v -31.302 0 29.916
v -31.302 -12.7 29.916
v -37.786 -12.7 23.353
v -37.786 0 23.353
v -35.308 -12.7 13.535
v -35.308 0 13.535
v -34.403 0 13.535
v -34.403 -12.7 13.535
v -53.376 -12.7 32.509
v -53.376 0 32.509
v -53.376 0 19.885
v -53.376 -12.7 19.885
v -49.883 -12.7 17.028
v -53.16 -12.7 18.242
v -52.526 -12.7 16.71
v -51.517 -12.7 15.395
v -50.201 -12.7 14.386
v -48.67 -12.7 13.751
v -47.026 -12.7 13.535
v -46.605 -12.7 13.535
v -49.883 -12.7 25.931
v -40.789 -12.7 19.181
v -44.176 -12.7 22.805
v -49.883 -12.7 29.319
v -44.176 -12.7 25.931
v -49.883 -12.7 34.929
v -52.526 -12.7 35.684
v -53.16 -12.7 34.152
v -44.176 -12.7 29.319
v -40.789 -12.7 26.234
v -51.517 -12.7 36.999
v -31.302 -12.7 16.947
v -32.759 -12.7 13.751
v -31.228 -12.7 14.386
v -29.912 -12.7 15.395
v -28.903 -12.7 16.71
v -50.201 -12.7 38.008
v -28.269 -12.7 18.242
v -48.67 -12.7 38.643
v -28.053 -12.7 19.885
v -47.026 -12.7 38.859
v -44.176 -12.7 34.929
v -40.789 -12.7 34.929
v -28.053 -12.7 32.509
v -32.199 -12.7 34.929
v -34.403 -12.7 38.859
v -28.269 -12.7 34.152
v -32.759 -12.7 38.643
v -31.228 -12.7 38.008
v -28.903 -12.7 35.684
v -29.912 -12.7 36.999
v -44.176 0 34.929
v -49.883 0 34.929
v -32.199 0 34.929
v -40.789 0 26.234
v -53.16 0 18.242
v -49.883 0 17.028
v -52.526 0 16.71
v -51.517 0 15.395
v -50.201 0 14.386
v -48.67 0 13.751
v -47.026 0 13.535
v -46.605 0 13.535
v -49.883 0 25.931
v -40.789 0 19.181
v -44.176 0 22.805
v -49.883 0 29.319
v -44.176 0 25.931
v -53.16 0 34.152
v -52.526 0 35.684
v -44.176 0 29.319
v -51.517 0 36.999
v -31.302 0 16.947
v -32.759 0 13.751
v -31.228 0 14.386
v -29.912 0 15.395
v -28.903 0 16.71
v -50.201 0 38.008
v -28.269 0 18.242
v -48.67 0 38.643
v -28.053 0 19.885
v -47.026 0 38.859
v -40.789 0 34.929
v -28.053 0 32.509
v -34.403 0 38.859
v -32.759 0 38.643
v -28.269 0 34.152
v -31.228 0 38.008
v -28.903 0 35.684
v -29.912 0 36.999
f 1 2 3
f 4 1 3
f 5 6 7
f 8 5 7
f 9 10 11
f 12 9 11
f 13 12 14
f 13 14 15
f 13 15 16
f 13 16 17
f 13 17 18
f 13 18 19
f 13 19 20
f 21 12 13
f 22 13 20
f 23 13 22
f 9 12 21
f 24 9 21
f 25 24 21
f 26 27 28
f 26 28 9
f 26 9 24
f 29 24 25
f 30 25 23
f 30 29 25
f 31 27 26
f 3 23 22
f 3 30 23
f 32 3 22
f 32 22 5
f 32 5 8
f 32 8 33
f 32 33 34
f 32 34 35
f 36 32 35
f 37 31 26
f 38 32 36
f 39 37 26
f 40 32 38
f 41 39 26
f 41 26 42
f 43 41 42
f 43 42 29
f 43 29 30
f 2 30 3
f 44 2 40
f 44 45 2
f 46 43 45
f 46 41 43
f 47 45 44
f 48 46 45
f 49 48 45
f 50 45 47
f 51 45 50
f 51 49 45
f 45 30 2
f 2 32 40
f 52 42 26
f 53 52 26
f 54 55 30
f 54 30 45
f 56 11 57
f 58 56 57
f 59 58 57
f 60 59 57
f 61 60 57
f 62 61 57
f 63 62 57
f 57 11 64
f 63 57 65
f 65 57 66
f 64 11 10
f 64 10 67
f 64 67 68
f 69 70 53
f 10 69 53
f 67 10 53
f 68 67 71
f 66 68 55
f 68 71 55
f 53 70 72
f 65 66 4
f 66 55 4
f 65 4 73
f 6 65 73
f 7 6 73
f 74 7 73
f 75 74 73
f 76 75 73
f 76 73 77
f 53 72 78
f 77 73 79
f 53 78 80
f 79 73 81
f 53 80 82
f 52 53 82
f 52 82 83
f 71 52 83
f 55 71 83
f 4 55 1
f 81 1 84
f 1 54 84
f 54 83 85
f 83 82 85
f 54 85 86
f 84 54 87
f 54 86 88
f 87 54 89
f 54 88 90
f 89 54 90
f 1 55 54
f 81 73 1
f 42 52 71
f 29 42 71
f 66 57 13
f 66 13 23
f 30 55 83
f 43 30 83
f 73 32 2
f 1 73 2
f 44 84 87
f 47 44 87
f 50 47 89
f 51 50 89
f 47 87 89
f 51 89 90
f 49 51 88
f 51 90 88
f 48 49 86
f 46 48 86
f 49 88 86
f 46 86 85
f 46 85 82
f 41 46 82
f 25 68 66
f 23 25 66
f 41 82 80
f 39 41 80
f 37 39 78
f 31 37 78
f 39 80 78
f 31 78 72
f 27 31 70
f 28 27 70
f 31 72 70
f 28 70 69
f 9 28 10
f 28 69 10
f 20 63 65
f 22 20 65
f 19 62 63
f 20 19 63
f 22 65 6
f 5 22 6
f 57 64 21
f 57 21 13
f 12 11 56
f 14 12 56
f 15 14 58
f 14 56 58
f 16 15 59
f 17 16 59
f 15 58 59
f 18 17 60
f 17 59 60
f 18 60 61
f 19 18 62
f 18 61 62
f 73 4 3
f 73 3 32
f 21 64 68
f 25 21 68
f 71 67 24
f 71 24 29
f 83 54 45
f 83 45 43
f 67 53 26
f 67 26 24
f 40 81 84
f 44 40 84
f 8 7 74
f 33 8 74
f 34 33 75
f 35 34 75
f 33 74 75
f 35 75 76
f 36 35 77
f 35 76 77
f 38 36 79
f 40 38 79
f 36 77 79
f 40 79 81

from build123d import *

# Parameters (mm, degrees)
F2_DEPTH = 12.7
F3_DEPTH = 25.4
F4_W     = 7.152606
F4_H     = 3.387249
F5_DEPTH = 12.7
F7_DEPTH = 254


with BuildPart() as f2:
    # F0 (on Front) → F2 (new body)
    with BuildSketch(Plane.XZ):
        with BuildLine():
            Line((-34.402621, 38.858883), (-47.026384, 38.858883))
            ThreePointArc((-47.026384, 38.858883), (-51.516512, 36.999011), (-53.376384, 32.508883))
            Line((-53.376384, 32.508883), (-53.376384, 19.885116))
            ThreePointArc((-53.376384, 19.885116), (-51.516512, 15.394988), (-47.026384, 13.535116))
            Line((-47.026384, 13.535116), (-34.402621, 13.535116))
            ThreePointArc((-34.402621, 13.535116), (-29.912493, 15.394988), (-28.052621, 19.885116))
            Line((-28.052621, 19.885116), (-28.052621, 32.508883))
            ThreePointArc((-28.052621, 32.508883), (-29.912493, 36.999011), (-34.402621, 38.858883))
        make_face()
    extrude(amount=F2_DEPTH)

    # F1 (on Front) → F3 (cut, symmetric)
    with BuildSketch(Plane.XZ):
        Polygon((-32.199131, 34.929331), (-49.883451, 34.929331), (-49.883451, 17.02805), align=None)
        Polygon((-31.301971, 16.947381), (-31.301971, 29.916352), (-37.785975, 23.3528), align=None)
    extrude(amount=F3_DEPTH, both=True, mode=Mode.SUBTRACT)

    # F4 (on Front) → F5 (join)
    with BuildSketch(Plane.XZ):
        Polygon((-44.176444, 25.931474), (-44.176444, 21.922855), (-40.789195, 21.922855), (-40.789195, 36.714591), (-44.176444, 36.714591), (-44.176444, 29.318723), align=None)
        with Locations((-47.752747, 27.625099)):
            Rectangle(F4_W, F4_H)
    extrude(amount=F5_DEPTH)

    # F6 (on face) → F7 (cut)
    with BuildSketch(Plane(origin=(0, 0, 0), x_dir=(-1, 0, 0), z_dir=(0, 1, 0))):
        Polygon((35.308003, 13.535116), (46.605372, 13.535116), (40.789195, 19.181317), align=None)
        Polygon((33.403759, 11.573545), (47.081295, 13.073102), (46.605372, 13.535116), (35.308003, 13.535116), align=None)
    extrude(amount=-F7_DEPTH, mode=Mode.SUBTRACT)


solid = f2.part
